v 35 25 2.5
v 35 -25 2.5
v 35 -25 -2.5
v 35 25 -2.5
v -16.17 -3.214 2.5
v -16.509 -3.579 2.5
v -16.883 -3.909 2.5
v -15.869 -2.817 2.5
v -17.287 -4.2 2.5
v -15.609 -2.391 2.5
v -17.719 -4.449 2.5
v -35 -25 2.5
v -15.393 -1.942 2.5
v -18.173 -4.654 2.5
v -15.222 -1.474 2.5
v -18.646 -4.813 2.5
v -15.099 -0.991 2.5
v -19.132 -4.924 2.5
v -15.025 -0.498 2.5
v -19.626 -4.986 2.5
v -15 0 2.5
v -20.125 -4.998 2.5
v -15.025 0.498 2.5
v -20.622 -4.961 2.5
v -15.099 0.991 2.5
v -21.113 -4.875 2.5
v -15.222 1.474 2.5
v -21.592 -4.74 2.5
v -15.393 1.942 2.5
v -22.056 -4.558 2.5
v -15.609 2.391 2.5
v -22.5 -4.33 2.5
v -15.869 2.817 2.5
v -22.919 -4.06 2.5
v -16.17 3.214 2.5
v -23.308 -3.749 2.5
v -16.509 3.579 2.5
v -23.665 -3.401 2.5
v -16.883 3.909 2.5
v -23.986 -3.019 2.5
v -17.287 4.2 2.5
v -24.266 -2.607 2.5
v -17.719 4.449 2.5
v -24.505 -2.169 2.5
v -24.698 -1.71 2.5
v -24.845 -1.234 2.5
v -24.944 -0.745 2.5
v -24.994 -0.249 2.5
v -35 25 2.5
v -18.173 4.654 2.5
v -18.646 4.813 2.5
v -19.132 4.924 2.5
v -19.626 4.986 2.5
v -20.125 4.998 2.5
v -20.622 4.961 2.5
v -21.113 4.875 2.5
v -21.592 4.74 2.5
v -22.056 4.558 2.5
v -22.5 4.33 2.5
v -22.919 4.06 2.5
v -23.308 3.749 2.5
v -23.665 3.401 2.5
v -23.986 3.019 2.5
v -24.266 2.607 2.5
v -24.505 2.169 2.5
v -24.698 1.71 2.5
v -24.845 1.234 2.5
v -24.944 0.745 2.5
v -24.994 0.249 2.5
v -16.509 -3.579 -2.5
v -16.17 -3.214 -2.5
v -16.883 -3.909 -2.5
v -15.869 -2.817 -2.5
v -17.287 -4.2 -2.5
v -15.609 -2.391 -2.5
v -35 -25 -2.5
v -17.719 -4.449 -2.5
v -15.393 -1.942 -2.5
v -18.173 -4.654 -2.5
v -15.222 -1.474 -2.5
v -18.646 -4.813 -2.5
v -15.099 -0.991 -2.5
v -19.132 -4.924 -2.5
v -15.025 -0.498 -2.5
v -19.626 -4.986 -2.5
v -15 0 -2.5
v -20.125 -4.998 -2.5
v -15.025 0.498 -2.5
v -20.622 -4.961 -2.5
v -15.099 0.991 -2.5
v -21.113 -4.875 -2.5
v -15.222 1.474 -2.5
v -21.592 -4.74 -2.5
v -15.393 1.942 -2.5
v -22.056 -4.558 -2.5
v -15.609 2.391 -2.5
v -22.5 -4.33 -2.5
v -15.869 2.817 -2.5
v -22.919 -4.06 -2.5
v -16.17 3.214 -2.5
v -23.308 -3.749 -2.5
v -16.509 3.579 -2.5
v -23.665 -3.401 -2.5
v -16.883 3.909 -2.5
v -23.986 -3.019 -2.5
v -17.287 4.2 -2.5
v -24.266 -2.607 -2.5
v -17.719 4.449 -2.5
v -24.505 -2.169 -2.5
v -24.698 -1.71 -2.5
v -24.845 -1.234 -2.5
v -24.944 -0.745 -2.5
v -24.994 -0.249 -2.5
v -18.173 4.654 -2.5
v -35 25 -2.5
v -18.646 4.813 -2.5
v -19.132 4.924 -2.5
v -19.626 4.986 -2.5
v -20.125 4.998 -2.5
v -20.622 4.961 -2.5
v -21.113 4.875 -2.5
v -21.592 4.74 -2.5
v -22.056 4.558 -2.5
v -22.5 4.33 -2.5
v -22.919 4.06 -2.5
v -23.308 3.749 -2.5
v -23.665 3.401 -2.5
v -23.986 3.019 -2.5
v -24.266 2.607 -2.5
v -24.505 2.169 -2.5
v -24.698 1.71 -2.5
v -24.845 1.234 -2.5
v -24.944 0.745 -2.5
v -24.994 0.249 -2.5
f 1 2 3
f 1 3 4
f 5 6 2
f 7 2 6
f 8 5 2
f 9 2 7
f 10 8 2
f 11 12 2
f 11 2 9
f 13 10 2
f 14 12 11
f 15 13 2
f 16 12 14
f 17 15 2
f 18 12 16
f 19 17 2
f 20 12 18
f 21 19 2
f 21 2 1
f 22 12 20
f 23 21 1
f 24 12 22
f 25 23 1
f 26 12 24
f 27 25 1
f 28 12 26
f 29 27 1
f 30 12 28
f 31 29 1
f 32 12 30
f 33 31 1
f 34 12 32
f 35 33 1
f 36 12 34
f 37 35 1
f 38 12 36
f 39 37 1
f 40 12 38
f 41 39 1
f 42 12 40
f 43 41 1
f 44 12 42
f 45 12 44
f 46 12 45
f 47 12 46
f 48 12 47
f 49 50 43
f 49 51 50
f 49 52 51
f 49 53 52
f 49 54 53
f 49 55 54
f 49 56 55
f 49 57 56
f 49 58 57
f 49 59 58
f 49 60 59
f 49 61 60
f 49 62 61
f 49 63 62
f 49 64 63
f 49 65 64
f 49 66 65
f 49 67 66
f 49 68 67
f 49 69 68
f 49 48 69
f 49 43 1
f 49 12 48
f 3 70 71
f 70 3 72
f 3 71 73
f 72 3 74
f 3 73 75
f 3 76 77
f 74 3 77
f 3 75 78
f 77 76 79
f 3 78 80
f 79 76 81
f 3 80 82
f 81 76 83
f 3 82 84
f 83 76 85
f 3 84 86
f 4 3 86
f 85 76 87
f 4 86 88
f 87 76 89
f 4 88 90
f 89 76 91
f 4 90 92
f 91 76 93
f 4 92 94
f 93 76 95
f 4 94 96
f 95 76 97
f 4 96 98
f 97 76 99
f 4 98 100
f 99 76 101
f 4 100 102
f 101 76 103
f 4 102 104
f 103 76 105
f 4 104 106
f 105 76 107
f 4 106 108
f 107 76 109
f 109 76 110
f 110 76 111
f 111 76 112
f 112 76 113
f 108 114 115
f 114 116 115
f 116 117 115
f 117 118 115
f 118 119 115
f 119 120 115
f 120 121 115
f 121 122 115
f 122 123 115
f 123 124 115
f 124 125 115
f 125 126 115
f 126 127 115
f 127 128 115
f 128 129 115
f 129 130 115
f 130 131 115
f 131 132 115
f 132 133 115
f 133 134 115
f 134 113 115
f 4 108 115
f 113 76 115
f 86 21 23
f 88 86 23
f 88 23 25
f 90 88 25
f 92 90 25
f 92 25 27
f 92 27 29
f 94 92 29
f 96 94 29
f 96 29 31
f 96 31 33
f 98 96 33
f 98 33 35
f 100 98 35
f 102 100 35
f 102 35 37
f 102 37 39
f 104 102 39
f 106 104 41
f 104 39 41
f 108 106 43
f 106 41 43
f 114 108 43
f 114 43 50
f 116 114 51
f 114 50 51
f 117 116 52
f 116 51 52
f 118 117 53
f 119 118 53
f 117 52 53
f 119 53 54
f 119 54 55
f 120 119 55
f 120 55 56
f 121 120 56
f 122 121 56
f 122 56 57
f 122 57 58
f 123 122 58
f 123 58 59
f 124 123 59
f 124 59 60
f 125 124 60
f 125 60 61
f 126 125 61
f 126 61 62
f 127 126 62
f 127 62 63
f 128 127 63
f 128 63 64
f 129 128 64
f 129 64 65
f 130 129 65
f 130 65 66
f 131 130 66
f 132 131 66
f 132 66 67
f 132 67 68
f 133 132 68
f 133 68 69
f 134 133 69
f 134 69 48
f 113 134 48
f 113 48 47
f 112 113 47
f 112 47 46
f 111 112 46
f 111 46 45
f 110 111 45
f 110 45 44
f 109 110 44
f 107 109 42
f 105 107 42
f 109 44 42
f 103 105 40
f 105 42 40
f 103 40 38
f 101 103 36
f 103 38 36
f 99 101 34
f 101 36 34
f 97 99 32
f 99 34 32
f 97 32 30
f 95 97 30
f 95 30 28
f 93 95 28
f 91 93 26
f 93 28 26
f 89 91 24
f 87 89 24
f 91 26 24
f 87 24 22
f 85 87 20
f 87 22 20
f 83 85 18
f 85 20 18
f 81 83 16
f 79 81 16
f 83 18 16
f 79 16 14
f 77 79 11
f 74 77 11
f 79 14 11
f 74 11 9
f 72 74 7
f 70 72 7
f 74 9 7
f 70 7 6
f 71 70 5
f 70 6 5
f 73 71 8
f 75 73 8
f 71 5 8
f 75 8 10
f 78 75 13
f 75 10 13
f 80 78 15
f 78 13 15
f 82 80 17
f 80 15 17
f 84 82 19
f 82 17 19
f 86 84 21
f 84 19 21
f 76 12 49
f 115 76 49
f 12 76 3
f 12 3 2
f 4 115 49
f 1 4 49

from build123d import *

# Parameters (mm, degrees)
PLAT_W                          = 50
PLAT_H                          = 5
EL_MENT_M_CANO_SOUD_1_DEPTH     = 70
DIAM_TRE_DU_PER_AGE_10_0_10_1_D = 10


with BuildPart() as part:
    # plat → Elément mécano-soudé1 (new body)
    with BuildSketch(Plane.YZ.offset(-35)):
        Rectangle(PLAT_W, PLAT_H)
    extrude(amount=EL_MENT_M_CANO_SOUD_1_DEPTH)

    # Diamètre du perçage Ø10.0 (10)1 (through all)
    with Locations(Plane(origin=(0, 0, -2.5), x_dir=(-1, 0, 0), z_dir=(0, 0, -1))):
        with Locations((20, 0)):
            Hole(DIAM_TRE_DU_PER_AGE_10_0_10_1_D / 2)


solid = part.part
